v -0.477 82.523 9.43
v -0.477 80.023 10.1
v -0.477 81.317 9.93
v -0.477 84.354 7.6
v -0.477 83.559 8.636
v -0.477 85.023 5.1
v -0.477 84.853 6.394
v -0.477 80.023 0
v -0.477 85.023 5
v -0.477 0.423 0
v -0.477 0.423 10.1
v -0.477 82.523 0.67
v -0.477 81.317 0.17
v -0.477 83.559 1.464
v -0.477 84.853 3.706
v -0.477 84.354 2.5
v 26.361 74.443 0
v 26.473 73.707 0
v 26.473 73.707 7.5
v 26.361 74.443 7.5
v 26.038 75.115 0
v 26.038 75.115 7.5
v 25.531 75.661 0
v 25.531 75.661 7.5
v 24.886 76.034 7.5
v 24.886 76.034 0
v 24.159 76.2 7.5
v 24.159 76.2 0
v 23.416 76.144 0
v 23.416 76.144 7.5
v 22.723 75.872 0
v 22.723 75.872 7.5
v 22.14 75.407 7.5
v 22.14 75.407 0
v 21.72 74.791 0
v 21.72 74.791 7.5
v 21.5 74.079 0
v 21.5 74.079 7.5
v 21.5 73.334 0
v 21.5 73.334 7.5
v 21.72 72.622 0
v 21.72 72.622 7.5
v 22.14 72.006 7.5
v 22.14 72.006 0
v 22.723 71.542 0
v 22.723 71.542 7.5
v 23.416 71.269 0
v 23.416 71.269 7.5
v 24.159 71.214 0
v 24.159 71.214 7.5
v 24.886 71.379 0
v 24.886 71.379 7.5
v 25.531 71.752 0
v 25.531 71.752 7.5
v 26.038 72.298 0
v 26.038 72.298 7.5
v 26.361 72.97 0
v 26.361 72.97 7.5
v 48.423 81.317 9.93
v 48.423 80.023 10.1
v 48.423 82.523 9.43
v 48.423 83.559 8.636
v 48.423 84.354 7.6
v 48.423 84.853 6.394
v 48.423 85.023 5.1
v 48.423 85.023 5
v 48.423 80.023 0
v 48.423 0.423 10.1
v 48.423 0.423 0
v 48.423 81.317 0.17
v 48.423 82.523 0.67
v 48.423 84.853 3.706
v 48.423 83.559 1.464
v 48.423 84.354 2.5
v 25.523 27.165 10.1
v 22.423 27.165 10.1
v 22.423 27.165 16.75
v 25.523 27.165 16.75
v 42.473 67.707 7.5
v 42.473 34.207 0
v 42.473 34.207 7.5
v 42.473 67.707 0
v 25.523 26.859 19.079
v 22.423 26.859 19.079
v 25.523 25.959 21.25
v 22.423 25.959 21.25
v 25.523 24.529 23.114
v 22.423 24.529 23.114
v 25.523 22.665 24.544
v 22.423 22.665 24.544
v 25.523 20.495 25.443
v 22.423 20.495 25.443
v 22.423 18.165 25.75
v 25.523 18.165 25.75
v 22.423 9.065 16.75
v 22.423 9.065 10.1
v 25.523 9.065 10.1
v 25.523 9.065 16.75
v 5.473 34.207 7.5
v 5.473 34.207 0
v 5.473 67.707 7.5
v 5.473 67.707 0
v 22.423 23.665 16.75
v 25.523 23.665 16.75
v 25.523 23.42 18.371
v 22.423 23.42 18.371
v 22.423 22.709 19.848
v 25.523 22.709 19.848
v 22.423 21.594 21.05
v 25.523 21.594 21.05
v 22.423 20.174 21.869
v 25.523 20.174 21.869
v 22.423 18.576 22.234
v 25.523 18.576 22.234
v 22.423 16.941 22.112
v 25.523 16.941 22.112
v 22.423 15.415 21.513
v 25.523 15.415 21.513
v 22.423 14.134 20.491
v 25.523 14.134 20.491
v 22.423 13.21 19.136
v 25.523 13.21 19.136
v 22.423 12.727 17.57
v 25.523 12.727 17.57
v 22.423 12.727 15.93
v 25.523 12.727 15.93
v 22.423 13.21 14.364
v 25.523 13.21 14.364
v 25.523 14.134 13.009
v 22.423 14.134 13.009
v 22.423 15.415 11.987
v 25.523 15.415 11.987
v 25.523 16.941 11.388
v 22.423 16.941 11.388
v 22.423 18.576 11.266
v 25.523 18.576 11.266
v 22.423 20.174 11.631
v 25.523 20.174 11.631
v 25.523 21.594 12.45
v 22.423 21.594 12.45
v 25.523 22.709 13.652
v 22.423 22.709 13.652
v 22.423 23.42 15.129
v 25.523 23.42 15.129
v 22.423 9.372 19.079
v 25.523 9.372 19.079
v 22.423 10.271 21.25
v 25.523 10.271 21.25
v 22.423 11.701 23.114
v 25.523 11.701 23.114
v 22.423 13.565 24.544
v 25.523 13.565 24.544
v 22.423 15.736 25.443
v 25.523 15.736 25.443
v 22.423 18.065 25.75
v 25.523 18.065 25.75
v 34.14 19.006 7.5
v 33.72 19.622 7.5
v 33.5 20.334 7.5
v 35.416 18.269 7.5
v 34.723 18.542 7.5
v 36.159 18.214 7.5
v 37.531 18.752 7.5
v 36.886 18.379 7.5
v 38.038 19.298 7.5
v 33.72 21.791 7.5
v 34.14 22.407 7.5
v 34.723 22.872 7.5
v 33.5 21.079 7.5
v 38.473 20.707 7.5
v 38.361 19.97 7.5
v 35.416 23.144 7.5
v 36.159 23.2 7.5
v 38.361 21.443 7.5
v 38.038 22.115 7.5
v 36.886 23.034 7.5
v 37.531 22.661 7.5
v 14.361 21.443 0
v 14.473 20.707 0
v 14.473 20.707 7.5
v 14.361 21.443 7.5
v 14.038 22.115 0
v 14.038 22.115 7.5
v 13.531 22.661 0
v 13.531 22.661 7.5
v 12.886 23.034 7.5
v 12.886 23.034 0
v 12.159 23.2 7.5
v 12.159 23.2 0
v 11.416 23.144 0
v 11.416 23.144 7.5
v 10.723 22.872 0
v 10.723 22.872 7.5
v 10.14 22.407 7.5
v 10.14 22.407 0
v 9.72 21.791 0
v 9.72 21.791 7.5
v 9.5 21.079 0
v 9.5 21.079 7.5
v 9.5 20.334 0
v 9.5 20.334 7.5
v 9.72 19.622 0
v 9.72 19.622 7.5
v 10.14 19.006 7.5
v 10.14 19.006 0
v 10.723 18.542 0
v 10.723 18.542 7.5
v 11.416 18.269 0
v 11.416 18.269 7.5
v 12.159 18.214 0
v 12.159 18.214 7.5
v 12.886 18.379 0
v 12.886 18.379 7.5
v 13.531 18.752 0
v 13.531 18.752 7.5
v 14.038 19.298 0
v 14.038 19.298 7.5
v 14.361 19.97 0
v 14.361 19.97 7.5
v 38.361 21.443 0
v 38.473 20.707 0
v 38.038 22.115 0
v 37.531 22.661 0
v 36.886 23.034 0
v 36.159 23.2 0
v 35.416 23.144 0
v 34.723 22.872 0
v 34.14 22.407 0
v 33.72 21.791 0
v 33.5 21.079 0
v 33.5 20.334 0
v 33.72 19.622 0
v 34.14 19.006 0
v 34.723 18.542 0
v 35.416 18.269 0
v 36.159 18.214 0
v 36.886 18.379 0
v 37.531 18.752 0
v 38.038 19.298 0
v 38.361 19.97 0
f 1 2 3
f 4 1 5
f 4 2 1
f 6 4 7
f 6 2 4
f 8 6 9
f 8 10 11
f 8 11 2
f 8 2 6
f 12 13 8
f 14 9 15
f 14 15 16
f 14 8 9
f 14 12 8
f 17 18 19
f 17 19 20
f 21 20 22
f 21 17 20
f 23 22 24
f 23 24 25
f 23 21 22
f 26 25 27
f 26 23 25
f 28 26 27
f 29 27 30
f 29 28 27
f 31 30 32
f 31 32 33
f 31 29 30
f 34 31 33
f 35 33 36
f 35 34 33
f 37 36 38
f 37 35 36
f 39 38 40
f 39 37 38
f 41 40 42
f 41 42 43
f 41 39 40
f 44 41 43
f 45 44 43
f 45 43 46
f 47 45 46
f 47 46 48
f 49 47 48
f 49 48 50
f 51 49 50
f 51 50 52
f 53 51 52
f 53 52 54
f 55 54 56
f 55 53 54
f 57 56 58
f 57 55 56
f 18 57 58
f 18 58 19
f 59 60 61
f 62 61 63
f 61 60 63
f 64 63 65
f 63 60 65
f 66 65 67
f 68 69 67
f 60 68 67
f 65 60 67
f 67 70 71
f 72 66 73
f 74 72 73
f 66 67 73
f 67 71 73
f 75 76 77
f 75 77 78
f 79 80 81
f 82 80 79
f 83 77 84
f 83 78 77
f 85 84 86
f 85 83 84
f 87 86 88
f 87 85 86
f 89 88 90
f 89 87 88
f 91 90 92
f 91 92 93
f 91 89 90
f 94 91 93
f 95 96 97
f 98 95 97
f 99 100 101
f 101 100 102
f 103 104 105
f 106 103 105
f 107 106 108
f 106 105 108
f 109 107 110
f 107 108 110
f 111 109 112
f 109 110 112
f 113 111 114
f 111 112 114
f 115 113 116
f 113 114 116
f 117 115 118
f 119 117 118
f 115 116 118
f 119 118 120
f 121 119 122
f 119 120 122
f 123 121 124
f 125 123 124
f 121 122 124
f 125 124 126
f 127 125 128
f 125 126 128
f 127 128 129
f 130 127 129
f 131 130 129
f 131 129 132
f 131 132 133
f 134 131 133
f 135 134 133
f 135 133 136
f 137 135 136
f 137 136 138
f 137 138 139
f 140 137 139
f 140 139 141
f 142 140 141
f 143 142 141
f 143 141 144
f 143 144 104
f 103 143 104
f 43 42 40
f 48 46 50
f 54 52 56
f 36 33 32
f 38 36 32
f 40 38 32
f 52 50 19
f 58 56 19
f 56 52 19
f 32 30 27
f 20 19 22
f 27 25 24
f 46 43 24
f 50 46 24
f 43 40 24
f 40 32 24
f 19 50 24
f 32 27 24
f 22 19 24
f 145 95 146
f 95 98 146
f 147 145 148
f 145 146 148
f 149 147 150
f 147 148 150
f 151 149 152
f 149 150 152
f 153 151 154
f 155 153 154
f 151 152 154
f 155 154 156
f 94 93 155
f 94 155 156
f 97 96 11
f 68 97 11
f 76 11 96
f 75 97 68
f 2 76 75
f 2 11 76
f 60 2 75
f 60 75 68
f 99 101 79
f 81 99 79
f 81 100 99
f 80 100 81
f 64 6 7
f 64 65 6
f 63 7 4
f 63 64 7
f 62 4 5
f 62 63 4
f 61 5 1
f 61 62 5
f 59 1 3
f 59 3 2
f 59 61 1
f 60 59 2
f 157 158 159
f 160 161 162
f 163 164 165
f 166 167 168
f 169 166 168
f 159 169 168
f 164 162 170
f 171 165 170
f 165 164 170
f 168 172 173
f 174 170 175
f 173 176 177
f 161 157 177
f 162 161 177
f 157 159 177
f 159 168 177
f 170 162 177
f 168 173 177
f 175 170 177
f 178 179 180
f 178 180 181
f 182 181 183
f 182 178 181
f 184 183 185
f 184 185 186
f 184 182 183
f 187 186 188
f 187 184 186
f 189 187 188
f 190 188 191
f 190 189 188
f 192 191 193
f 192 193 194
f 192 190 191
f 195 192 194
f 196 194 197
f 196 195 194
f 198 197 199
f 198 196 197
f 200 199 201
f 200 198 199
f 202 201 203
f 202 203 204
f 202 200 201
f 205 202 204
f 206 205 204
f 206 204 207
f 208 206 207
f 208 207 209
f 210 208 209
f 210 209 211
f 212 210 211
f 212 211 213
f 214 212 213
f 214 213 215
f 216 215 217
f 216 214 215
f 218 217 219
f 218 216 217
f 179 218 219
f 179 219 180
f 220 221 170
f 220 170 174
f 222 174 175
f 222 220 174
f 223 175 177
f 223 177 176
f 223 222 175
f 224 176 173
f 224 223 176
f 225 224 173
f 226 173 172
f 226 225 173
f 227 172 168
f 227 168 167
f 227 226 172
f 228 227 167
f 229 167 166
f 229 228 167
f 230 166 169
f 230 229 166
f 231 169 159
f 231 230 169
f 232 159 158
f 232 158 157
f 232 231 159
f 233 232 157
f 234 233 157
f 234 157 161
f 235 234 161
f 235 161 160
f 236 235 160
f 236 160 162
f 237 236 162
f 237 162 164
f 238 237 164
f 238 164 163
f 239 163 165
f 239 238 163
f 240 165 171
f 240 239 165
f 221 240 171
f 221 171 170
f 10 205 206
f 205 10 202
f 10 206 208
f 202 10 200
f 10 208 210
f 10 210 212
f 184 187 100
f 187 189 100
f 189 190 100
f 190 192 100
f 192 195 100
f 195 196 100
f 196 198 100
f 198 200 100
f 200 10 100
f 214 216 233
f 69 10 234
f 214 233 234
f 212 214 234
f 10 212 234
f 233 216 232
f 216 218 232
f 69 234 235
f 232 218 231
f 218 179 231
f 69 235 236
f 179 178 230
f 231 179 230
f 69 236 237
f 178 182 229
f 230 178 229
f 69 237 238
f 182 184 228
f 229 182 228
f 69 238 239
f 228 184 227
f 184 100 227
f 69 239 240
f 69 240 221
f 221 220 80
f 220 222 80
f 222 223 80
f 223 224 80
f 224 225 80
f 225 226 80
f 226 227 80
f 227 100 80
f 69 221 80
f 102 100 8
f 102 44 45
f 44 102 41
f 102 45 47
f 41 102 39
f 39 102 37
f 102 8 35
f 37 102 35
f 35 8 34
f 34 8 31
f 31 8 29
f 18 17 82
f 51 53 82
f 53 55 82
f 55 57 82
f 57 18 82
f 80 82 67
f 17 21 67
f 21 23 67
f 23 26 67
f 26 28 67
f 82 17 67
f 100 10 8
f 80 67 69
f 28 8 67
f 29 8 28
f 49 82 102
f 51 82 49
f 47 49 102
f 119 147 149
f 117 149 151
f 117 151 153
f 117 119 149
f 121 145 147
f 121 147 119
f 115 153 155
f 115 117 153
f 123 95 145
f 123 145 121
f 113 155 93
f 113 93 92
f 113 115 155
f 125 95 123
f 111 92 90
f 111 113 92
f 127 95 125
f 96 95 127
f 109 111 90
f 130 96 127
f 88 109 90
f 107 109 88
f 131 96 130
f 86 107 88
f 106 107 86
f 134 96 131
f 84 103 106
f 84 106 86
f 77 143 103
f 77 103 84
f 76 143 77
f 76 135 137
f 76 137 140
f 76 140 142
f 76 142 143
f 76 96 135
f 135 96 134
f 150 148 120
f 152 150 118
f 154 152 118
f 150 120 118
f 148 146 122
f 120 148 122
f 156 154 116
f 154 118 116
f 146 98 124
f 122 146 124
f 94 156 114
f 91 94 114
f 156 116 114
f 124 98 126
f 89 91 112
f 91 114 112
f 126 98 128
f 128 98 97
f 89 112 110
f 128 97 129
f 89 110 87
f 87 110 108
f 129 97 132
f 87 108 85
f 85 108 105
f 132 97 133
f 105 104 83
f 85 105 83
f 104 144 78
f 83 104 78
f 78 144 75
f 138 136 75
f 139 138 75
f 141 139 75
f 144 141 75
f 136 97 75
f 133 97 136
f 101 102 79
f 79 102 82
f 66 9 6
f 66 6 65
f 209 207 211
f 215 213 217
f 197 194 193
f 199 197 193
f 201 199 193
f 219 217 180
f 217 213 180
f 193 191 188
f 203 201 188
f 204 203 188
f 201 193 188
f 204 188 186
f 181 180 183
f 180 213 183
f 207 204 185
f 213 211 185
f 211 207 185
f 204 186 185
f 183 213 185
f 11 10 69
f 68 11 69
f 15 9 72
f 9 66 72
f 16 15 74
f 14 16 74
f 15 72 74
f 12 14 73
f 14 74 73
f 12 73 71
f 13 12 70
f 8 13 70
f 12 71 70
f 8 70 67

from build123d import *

# Parameters (mm, degrees)
F0_W     = 3.1
F0_H     = 18.1
F1_DEPTH = 25.75
F0_W_2   = 48.9
F0_H_2   = 84.6
F2_DEPTH = 10.1
F3_R     = 5
F4_R     = 9
F5_R     = 5.499402
F6_DEPTH = 26.001
F7_R     = 2.5
F7_W     = 37
F7_H     = 33.5
F8_DEPTH = 7.5


with BuildPart() as f1:
    # F0 (on Top) → F1 (new body)
    with BuildSketch(Plane.XY):
        with Locations((23.972543, 18.115168)):
            Rectangle(F0_W, F0_H)
    extrude(amount=F1_DEPTH)

    # F0 (on Top) → F2 (join)
    with BuildSketch(Plane.XY):
        with Locations((23.972543, 42.723387)):
            Rectangle(F0_W_2, F0_H_2)
        with Locations((23.972543, 18.115168)):
            Rectangle(F0_W, F0_H, mode=Mode.SUBTRACT)
    extrude(amount=F2_DEPTH)

    # F3
    f3_edges = [f1.edges().sort_by_distance(p)[0] for p in [
        (23.972543, 85.023387, 10.1),
        (23.972543, 85.023387, 0),
    ]]
    fillet(f3_edges, radius=F3_R)

    # F4
    f4_edges = [f1.edges().sort_by_distance(p)[0] for p in [
        (23.972543, 9.065168, 25.75),
        (23.972543, 27.165168, 25.75),
    ]]
    fillet(f4_edges, radius=F4_R)

    # F5 (on face) → F6 (cut, through all)
    with BuildSketch(Plane.YZ.offset(25.522543)):
        with Locations((18.165168, 16.75)):
            Circle(F5_R)
    extrude(amount=-F6_DEPTH, mode=Mode.SUBTRACT)

    # F7 (on face) → F8 (cut)
    with BuildSketch(Plane.XY):
        with Locations((23.972543, 73.70657)):
            Circle(F7_R)
        with Locations((35.972543, 20.70657)):
            Circle(F7_R)
        with Locations((11.972543, 20.70657)):
            Circle(F7_R)
        with Locations((23.972543, 50.95657)):
            Rectangle(F7_W, F7_H)
    extrude(amount=F8_DEPTH, mode=Mode.SUBTRACT)


solid = f1.part
